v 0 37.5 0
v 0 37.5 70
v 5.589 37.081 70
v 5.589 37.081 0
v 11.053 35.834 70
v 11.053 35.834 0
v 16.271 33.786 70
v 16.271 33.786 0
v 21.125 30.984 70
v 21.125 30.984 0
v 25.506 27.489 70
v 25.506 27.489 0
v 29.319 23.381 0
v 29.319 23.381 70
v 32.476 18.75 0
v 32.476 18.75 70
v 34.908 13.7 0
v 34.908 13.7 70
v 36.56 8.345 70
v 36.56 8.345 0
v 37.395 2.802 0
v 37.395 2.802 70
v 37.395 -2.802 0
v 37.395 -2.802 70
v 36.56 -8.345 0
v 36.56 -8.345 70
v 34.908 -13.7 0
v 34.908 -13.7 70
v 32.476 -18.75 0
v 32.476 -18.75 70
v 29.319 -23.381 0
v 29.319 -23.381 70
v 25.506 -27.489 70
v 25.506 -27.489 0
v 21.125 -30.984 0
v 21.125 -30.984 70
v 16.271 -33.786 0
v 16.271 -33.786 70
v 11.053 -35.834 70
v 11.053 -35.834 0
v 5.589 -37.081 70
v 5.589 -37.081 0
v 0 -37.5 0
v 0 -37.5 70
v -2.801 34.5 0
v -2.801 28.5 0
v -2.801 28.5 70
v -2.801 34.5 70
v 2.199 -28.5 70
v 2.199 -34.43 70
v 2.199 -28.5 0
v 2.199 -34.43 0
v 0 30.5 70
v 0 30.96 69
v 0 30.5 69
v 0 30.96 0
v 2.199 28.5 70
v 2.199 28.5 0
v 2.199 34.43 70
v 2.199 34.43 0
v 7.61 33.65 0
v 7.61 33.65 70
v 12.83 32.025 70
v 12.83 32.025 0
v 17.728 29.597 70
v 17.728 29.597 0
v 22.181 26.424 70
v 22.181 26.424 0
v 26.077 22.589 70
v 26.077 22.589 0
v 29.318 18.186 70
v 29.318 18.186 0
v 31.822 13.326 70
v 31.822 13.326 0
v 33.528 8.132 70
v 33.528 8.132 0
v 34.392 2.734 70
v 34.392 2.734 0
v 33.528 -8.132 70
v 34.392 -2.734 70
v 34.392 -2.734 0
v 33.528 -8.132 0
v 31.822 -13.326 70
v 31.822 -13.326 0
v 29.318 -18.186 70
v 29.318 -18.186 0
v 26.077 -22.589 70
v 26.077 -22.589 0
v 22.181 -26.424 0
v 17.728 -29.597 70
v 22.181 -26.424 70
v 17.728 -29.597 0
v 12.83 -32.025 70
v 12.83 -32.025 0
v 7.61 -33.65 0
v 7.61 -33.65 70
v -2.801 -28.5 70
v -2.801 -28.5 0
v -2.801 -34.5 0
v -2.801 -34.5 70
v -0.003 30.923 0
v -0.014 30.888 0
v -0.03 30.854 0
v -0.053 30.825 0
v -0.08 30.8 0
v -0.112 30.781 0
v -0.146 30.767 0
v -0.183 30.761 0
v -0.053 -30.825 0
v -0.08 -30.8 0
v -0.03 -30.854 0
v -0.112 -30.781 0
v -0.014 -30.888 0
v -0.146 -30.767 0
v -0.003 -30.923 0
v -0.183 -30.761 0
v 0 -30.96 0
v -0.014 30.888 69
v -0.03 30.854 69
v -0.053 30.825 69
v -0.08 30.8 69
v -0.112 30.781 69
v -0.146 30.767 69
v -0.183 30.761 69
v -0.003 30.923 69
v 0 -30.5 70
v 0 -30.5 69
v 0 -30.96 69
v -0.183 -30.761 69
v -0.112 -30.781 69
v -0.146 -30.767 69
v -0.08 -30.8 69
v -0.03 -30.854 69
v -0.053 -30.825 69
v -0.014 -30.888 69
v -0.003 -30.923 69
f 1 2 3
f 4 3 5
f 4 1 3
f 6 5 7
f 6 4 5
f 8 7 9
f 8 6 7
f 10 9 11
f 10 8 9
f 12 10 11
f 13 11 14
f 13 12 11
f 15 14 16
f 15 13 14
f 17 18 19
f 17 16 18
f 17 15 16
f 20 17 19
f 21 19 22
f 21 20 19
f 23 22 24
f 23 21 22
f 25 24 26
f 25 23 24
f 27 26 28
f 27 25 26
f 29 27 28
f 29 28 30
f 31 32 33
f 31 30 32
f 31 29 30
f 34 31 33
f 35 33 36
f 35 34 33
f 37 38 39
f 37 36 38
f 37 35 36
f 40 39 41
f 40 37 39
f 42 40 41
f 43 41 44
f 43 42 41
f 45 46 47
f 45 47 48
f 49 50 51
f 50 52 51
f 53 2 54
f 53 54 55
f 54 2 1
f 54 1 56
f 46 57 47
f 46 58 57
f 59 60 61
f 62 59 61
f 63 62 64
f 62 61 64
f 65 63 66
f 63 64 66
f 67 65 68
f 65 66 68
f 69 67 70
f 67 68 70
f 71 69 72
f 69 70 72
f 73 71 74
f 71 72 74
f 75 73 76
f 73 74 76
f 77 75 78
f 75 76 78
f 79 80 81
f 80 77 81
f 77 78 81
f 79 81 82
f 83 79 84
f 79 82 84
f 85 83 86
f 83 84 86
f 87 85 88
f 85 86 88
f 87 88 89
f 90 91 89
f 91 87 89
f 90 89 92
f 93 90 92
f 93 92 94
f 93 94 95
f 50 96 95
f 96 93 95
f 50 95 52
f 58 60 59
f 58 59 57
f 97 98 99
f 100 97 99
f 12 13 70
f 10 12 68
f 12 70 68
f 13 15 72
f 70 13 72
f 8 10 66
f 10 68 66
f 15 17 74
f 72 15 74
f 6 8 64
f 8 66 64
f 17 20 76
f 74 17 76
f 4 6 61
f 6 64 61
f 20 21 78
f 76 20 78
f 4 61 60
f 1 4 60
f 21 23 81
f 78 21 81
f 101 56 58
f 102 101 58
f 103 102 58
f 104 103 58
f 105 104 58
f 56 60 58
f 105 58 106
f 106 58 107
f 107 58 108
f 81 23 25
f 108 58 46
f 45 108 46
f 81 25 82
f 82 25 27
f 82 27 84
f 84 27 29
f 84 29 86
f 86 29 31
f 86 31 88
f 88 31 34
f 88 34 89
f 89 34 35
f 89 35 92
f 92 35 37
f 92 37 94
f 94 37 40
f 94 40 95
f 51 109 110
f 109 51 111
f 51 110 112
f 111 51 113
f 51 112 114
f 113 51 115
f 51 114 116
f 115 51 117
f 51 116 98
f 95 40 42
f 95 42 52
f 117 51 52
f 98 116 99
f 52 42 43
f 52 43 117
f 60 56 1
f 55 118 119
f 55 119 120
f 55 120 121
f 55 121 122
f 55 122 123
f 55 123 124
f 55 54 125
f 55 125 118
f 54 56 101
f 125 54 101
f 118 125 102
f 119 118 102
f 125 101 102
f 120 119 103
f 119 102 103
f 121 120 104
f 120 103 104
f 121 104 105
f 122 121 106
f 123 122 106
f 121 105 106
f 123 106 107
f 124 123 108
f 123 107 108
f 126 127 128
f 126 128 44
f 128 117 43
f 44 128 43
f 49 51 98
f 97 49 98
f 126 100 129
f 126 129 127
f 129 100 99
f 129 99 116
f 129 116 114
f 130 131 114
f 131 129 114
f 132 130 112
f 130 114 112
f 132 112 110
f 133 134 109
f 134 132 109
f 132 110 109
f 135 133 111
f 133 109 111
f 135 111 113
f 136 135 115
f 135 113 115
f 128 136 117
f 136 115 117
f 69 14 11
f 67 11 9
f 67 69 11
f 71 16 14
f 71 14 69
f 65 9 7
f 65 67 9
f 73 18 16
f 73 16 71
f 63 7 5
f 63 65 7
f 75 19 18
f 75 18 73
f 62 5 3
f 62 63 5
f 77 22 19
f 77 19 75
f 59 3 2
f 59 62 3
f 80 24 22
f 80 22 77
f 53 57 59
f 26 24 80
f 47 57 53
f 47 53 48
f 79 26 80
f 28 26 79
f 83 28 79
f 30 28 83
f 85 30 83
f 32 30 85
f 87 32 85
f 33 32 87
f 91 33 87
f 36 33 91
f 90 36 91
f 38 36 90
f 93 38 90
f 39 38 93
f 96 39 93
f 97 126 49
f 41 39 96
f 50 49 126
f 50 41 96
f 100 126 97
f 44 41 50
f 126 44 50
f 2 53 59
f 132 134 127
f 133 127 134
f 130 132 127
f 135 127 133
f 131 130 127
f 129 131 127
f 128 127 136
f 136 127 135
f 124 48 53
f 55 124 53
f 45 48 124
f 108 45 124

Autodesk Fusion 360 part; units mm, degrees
sketch "Sketch4" plane through (0, 0, 0) normal (0, 0, 1) x (1, 0, 0)
  line L0 (0, 37.5) -> (0, -37.5)
  line L1 (0, 0) -> (37.5, 0)
  arc A0 (0, -34.5) -> (0, 34.5) centre (0, 0) ccw
  arc A1 (0, -37.5) -> (0, 37.5) centre (0, 0) ccw
  line L2 (0, 37.5) -> (-2.5, 37.5) construction
  line L3 (0, 34.5) -> (0, 30.5)
  line L4 (0, 30.5) -> (-2.8008, 34.5)
  line L5 (-2.8008, 34.5) -> (-2.8008, 28.5)
  line L6 (-2.8008, 28.5) -> (2.1992, 28.5)
  line L7 (2.1992, 28.5) -> (2.1992, 34.4298)
  line L8 (2.1992, -28.5) -> (2.1992, -34.4298)
  line L9 (0, -34.5) -> (0, -30.5)
  line L10 (0, -30.5) -> (-2.8008, -34.5)
  line L11 (-2.8008, -34.5) -> (-2.8008, -28.5)
  line L12 (-2.8008, -28.5) -> (2.1992, -28.5)
  dimension "d10" = 75
  dimension "d20" = 4
  dimension "d21" = 35
  dimension "d23" = 5
  dimension "d29" = 2
  dimension "d30" = 6
  dimension "d36" = 3
extrude "Extrude6" add sketch "Sketch4" along normal blind 70 contours L0 L1 A0 A1 | L0 A0 L3 L6 L7 | L0 L1 A0 A1 | L0 L4 L5 L6 | L0 A0 L8 L9 L12 | L0 L10 L11 L12 makes body 1
sketch "Sketch6" plane through (0, 0, 70) normal (0, 0, 1) x (-1, 0, 0)
  arc A0 (0, 37.5) -> (0, -37.5) centre (0, 0) ccw
  line L0 (0, 30.5) -> (0, 37.5)
  line L1 (0, -30.5) -> (2.8008, -34.5)
  line L2 (2.8008, -34.5) -> (2.8008, -28.5)
  line L3 (2.8008, -28.5) -> (-2.1992, -28.5)
  line L4 (0, 37.5) -> (0, -28.5)
  line L5 (0, -28.5) -> (2.8008, -28.5)
  line L6 (0, -30.5) -> (0, -28.5)
  line L7 (2.8008, -28.5) -> (2.8008, -34.5)
  line L8 (-2.1992, -31.9243) -> (-2.1992, -26)
  line L9 (-2.1992, -31.9243) -> (0, -31.9243)
  line L10 (-2.1992, -28.5) -> (-2.1992, -34.4298)
  arc A1 (-2.1992, 34.4298) -> (-2.1992, -34.4298) centre (0, 0) ccw
  line L11 (-2.1992, 34.4298) -> (-2.1992, 28.5)
  line L12 (-2.1992, 28.5) -> (2.8008, 28.5)
  line L13 (2.8008, 28.5) -> (2.8008, 34.5)
  line L14 (2.8008, 34.5) -> (0, 30.5)
  line L15 (0, -37.5) -> (0, -30.5)
  arc A2 (2.7253, -34.3922) -> (2.8008, -34.3861) centre (0, 0) ccw
  arc A3 (2.8008, 34.3861) -> (2.7253, 34.3922) centre (0, 0) ccw
  arc A4 (0, 34.5) -> (-2.1992, 34.4298) centre (0, 0) ccw
  arc A5 (-2.1992, -34.4298) -> (0, -34.5) centre (0, 0) ccw
extrude "Extrude7" cut sketch "Sketch6" against normal blind 1 contours L0 L4 L11 L12 A4 | L9 L10 L15 A5 | L4 L12 L13 L14 A3 | L3 L6 L8 L9 L10 L15 | L13 L14 A3 | L1 L2 L3 L5 L6 L7 A2 | L1 L2 L7 A2 bodies 1
mirror "Mirror2" about plane through (0, 0, 0) normal (0, 1, 0) of "Extrude7"
sketch "Sketch7" plane through (0, 0, 69) normal (0, 0, 1) x (-1, 0, 0)
  line L0 (2.8008, -34.5) -> (2.8008, -28.5)
  line L1 (2.8008, -28.5) -> (-2.1992, -28.5)
  line L2 (2.8008, -34.5) -> (2.8008, -28.5)
  line L3 (0, -30.5) -> (2.8008, -34.5)
  line L4 (0, -30.5) -> (2.8008, -34.5)
  line L5 (2.7008, -28.5) -> (2.7008, -34.1828)
  line L6 (2.7008, -34.1828) -> (0, -30.3257)
  line L7 (0, -30.5) -> (0, -30.3257)
  arc A0 (-2.1992, -34.4298) -> (0, -34.5) centre (0, 0) ccw
  dimension "d37" = 0.1
  dimension "d38" = 0.1
extrude "Extrude8" cut sketch "Sketch7" against normal blind 70 bodies 1
mirror "Mirror3" about plane through (0, 0, 0) normal (0, 1, 0) of "Extrude6", "Extrude7", "Extrude8", "Mirror2" makes body 2
fillet "Fillet1" radius 0.2 4 edges at (-2.7008, 34.1828, 34.5) (0, 30.3257, 34.5) (-2.7008, -34.1828, 34.5) (0, -30.3257, 34.5) on bodies 1 2
combine "Combine1" operation add target body 2 tool bodies 1
